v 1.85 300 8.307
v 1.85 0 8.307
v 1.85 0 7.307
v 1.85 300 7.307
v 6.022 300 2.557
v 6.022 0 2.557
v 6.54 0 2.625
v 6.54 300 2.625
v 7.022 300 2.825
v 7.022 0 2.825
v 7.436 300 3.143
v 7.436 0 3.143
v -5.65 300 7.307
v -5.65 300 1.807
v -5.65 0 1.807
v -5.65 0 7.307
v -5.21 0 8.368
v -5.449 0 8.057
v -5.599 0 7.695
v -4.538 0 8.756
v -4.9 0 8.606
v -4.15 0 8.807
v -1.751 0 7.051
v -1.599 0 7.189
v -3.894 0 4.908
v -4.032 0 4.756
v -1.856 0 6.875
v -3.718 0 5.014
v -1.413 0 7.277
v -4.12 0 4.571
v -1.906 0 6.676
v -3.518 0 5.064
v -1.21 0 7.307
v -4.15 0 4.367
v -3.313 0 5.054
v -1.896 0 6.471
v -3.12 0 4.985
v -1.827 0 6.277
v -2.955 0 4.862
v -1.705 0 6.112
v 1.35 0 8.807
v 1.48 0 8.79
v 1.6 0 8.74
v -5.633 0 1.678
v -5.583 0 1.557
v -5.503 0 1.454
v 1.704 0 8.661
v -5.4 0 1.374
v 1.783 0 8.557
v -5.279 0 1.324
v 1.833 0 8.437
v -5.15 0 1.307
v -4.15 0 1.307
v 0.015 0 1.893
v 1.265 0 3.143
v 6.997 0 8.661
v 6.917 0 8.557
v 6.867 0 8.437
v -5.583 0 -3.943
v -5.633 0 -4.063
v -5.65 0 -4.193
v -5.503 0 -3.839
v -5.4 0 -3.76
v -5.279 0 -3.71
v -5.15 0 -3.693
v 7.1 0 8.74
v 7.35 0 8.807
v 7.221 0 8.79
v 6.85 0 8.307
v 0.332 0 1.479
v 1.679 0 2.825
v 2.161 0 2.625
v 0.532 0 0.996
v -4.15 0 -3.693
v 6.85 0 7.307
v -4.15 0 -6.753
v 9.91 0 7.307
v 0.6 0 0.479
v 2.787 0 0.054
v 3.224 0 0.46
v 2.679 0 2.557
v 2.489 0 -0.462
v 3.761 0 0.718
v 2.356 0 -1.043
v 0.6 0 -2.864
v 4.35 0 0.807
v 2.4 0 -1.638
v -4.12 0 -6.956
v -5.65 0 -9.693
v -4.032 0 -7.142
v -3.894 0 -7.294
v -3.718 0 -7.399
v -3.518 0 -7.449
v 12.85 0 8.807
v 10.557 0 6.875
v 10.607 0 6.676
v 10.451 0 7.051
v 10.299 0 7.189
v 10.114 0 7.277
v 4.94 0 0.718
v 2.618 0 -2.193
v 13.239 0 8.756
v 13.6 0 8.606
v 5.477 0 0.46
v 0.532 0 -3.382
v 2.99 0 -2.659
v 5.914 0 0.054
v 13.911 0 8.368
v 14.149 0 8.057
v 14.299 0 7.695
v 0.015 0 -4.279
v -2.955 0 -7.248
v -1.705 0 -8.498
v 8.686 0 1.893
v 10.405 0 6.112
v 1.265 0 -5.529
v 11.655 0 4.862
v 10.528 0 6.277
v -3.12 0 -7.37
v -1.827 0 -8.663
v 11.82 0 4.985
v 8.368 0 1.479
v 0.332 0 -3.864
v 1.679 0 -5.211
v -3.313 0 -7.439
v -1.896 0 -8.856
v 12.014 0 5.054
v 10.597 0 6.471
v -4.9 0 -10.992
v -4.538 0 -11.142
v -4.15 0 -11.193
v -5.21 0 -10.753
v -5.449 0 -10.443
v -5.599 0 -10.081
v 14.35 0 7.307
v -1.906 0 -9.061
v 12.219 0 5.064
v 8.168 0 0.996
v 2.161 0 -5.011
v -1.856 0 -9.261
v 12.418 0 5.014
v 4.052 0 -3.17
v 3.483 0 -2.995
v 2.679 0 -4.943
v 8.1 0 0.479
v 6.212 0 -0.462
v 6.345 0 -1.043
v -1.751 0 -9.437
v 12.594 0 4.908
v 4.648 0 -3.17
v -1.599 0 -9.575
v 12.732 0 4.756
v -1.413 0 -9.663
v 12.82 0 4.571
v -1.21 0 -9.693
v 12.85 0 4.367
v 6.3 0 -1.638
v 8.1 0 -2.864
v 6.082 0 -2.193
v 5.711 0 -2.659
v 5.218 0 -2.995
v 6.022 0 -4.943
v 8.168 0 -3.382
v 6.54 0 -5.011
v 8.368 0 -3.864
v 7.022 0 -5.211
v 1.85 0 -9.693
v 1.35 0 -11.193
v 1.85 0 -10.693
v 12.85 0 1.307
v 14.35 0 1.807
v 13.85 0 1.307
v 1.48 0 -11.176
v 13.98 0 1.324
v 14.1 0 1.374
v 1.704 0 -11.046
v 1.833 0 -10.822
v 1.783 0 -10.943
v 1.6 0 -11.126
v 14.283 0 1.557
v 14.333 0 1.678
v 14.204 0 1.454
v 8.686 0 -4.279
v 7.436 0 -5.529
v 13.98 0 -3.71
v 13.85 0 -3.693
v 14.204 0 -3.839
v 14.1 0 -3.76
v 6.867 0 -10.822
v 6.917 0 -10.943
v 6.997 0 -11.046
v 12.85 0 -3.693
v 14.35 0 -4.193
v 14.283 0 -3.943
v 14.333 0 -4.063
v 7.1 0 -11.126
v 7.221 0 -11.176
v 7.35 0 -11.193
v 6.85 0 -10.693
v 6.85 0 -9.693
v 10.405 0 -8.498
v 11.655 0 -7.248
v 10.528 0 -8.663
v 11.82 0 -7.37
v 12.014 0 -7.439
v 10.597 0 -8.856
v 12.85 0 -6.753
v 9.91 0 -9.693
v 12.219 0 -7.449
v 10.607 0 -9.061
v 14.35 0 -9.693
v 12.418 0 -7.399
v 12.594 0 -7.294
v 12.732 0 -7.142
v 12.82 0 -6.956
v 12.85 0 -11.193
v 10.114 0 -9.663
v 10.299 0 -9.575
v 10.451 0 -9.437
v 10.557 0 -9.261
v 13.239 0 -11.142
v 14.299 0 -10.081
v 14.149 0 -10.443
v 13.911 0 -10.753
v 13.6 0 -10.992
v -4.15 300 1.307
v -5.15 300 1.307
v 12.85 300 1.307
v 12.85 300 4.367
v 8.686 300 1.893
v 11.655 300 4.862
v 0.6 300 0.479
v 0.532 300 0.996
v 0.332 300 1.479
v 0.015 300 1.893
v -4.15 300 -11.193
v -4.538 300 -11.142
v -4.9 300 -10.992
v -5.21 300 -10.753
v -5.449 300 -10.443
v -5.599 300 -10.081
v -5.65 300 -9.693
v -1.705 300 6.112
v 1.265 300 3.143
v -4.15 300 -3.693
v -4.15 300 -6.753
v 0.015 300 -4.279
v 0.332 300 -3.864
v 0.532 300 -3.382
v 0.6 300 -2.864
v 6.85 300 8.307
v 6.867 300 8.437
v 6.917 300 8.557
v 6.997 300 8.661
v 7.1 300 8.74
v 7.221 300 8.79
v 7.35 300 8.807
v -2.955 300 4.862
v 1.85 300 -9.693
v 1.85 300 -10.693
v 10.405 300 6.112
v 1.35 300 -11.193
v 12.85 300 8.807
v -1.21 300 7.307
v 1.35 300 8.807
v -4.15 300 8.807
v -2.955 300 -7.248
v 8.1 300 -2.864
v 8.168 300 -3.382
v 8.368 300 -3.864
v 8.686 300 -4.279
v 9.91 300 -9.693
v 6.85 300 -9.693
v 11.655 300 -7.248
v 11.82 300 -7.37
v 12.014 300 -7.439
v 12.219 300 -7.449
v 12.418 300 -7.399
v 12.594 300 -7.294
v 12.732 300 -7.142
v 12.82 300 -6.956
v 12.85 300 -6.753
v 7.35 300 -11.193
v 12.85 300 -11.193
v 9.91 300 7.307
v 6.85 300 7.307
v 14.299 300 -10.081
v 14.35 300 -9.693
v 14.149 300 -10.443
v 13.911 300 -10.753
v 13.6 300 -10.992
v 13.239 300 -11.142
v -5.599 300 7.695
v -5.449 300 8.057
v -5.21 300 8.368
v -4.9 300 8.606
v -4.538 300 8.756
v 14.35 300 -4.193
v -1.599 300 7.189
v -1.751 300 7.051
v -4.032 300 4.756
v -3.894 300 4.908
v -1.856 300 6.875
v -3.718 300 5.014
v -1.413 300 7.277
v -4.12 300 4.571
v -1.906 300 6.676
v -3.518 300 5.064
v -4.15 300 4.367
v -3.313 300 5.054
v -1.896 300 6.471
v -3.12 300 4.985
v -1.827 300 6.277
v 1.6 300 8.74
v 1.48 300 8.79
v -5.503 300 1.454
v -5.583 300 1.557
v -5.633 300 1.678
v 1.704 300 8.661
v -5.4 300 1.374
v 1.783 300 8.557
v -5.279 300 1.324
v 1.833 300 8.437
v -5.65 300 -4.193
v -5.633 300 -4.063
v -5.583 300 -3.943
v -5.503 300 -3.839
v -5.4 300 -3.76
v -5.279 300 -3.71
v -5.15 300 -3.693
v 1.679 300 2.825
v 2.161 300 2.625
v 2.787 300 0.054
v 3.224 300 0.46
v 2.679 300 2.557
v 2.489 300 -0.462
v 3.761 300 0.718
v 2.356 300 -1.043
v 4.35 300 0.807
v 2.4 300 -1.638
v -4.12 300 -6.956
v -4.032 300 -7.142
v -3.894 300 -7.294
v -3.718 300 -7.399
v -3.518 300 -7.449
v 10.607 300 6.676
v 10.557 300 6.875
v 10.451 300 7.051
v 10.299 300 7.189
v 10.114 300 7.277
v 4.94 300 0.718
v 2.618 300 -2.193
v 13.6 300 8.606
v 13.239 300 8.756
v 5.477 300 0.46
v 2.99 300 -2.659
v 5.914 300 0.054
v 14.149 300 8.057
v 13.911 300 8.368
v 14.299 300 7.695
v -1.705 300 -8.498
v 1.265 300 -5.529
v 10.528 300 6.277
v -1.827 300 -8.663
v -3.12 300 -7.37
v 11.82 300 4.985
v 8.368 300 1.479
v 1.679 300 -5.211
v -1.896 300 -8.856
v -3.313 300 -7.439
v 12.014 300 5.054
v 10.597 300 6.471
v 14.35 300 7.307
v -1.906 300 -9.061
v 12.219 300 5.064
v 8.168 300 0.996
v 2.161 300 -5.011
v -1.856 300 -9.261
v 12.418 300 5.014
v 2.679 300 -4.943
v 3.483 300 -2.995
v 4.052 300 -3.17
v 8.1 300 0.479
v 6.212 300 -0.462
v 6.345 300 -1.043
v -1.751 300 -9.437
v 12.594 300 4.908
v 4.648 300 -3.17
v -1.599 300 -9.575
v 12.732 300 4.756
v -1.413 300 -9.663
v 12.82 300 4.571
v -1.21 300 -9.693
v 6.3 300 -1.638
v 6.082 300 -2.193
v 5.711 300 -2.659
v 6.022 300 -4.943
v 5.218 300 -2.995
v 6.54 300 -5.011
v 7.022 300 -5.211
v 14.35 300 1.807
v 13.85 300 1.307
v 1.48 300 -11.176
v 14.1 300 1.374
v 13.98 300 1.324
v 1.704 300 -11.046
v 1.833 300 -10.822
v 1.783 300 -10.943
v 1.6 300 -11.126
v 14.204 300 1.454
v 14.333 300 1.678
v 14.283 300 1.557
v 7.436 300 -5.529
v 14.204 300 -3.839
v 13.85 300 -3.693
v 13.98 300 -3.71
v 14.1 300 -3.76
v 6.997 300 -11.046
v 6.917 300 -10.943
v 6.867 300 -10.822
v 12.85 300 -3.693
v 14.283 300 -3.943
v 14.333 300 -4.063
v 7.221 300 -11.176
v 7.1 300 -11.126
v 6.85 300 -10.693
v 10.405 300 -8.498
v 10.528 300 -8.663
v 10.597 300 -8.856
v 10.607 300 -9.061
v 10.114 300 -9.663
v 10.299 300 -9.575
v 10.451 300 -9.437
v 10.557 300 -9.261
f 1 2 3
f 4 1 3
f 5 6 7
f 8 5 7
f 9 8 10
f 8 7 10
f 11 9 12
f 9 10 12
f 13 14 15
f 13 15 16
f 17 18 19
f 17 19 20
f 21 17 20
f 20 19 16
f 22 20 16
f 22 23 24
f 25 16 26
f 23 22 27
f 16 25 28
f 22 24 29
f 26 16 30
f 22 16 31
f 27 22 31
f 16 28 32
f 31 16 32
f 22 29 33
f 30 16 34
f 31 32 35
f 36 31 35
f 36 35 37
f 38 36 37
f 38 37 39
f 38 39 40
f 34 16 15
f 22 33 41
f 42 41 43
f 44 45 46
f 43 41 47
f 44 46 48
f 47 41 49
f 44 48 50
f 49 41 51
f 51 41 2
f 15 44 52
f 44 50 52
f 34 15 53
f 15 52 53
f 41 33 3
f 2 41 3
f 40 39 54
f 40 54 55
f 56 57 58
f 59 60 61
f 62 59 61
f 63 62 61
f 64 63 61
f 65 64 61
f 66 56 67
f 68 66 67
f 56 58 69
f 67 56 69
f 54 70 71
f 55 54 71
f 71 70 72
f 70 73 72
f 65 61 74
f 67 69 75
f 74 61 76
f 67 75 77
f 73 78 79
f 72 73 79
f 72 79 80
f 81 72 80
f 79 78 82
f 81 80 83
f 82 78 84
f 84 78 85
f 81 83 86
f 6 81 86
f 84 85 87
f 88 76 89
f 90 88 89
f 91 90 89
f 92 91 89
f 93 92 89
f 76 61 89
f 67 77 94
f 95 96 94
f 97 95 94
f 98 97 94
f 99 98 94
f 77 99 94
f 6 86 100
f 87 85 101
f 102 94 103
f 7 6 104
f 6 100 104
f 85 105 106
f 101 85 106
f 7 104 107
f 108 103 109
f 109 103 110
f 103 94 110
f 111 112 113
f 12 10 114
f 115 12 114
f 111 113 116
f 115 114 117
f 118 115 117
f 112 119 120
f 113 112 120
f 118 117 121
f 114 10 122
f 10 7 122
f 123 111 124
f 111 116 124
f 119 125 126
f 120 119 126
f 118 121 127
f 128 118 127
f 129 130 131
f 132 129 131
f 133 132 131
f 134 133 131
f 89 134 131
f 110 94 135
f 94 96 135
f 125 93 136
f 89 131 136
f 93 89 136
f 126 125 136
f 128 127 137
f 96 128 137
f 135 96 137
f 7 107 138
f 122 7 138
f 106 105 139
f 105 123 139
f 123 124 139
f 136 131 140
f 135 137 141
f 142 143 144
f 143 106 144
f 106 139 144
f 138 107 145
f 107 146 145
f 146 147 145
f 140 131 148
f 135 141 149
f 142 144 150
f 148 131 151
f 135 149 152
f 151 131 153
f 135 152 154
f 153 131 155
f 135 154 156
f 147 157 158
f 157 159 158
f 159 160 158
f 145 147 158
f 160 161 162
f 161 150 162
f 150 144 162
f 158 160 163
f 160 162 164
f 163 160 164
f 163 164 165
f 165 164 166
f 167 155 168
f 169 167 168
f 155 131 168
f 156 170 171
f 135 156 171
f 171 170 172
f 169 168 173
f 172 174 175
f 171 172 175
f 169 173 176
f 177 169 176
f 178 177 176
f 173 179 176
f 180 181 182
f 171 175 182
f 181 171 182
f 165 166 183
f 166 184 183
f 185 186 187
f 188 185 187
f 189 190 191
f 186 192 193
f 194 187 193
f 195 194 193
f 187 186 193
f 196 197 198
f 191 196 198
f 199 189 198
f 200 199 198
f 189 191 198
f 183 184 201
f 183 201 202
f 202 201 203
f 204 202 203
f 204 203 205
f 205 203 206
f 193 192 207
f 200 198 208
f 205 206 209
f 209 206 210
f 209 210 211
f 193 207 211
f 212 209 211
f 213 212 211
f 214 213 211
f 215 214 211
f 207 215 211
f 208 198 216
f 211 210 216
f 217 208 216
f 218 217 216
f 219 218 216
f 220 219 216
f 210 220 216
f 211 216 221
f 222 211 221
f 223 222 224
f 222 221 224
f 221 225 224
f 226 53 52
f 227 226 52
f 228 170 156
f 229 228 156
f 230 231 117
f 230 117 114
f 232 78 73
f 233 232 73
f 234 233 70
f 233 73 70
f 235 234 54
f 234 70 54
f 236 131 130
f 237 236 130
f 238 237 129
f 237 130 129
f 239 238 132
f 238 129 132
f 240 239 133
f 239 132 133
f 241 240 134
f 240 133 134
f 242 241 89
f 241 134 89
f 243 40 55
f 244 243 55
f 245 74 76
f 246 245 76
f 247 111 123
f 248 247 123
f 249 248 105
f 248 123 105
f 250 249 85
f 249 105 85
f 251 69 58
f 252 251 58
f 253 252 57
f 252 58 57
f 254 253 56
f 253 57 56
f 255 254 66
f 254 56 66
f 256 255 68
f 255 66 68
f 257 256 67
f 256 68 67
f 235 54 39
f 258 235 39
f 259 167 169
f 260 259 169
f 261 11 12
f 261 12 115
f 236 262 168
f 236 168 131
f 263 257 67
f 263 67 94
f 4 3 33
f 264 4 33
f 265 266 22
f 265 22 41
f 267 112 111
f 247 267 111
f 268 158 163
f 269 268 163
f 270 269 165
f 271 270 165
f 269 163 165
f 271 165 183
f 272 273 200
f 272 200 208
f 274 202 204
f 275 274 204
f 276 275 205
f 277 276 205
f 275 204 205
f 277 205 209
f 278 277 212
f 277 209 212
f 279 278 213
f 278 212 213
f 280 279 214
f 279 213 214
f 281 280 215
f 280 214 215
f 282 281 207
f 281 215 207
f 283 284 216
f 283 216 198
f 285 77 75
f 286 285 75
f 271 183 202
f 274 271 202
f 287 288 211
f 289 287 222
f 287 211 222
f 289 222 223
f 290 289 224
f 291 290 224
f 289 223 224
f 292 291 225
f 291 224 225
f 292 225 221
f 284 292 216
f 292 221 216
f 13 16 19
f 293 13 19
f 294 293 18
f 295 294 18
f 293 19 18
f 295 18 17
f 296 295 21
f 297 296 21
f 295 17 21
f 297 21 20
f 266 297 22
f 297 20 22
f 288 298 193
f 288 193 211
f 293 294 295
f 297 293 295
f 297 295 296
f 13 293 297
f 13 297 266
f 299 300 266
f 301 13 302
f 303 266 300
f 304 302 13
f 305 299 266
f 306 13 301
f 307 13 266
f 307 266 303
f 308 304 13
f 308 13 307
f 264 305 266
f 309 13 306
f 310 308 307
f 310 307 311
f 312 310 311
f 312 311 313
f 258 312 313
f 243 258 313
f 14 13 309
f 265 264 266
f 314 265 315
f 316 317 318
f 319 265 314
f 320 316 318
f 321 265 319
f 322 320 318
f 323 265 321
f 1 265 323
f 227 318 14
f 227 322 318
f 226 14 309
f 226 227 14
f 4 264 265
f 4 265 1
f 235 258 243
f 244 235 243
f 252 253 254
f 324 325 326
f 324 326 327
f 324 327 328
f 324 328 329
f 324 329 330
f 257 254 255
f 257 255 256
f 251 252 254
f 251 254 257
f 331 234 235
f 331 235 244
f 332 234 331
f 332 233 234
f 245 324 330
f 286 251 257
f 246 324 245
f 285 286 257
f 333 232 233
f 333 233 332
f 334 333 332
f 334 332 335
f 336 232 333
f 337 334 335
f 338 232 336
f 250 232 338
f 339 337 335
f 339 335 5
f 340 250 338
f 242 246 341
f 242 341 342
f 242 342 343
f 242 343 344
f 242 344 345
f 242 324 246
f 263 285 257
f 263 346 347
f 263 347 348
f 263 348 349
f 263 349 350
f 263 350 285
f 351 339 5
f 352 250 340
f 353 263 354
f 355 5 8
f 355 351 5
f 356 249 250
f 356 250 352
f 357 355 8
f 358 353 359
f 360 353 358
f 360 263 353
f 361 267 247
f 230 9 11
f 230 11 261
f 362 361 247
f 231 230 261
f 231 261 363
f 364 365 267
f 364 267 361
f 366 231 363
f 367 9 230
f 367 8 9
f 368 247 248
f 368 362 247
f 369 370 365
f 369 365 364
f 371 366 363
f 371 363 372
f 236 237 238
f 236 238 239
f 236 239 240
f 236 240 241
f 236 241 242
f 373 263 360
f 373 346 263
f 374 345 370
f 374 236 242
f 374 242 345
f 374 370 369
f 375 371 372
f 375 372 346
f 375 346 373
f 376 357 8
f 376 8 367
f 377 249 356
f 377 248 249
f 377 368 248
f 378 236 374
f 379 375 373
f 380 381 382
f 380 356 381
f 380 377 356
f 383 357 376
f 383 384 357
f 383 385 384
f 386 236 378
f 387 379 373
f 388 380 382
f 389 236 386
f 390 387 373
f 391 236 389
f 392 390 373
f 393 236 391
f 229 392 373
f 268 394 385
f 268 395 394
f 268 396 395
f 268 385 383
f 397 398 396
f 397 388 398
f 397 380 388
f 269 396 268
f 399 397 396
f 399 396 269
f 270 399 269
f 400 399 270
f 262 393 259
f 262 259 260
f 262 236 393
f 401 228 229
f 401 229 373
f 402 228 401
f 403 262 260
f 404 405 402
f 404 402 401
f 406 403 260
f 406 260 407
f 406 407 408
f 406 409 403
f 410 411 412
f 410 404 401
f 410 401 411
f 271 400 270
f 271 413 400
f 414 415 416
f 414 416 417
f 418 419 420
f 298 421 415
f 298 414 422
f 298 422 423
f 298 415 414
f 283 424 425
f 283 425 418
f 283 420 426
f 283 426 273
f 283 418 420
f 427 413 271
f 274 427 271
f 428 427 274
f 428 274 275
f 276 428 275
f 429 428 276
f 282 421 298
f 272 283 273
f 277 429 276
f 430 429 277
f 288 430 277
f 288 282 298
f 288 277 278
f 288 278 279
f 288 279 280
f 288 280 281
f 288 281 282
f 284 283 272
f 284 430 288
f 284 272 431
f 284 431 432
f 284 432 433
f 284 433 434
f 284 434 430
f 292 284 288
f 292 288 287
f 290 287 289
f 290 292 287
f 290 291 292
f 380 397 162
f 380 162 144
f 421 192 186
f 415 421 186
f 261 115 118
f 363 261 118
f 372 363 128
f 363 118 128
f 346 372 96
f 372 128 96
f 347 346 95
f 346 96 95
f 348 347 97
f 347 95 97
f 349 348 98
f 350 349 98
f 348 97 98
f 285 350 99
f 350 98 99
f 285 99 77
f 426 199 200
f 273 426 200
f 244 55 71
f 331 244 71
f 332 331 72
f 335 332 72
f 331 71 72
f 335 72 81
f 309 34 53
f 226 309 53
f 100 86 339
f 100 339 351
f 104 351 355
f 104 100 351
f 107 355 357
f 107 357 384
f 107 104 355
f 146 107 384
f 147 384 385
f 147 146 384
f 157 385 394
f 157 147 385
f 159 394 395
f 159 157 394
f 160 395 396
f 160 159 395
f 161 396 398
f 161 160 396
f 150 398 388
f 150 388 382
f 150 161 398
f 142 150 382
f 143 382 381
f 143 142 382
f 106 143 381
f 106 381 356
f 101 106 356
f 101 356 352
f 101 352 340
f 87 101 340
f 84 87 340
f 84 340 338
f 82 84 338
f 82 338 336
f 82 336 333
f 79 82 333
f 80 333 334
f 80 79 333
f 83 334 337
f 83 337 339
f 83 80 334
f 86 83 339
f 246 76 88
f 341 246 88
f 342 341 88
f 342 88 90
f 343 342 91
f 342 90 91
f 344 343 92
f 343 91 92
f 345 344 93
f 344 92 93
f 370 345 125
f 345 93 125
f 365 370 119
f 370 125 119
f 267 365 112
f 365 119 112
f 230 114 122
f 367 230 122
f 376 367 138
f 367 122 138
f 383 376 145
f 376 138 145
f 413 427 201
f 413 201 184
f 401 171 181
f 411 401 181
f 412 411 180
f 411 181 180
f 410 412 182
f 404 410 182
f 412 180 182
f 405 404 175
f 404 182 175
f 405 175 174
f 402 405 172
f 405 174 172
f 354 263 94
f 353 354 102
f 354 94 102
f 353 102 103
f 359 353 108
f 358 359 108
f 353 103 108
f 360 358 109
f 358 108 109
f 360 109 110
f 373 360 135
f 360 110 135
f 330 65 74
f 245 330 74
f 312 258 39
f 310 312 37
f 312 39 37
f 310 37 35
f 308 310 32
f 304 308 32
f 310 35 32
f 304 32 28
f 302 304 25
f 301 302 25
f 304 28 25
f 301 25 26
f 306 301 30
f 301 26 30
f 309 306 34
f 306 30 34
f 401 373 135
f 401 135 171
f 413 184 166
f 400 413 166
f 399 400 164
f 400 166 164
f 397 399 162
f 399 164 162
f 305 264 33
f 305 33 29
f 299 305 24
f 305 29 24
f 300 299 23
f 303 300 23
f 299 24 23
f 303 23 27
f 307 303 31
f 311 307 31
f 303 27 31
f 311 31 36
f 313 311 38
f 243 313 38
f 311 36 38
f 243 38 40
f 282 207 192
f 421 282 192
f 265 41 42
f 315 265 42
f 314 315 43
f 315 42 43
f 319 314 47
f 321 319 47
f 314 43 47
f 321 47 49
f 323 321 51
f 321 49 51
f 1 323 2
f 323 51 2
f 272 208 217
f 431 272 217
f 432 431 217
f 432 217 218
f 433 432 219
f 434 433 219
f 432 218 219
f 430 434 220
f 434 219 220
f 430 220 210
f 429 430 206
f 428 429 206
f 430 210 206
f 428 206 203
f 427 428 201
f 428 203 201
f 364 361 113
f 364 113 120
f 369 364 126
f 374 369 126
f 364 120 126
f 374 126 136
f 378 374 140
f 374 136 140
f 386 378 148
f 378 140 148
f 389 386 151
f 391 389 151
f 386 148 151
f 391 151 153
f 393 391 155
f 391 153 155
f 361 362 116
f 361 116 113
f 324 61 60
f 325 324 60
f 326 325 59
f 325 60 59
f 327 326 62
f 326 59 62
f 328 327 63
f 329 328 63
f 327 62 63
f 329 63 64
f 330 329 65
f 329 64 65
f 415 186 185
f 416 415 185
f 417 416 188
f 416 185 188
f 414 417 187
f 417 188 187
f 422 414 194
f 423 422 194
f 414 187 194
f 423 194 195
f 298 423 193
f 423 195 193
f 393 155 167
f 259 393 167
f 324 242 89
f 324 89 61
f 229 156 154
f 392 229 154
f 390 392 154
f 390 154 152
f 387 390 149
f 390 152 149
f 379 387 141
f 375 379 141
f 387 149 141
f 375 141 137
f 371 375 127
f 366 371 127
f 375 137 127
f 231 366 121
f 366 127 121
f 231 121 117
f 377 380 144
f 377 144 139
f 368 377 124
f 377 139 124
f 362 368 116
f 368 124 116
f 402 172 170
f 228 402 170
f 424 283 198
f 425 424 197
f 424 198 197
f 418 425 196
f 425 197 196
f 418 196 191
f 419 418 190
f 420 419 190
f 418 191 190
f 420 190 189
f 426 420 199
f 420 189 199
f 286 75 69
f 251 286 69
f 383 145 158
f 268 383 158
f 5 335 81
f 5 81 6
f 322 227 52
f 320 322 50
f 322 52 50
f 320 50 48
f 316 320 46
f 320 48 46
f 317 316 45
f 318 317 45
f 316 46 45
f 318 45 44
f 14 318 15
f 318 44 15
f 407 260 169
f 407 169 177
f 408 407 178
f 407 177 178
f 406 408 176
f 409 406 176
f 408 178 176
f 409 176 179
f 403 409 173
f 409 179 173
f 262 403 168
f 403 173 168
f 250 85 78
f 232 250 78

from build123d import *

# Parameters (mm, degrees)
ESQUISSE1_R        = 2
BOSS_EXTRU_1_DEPTH = 300


with BuildPart() as part:
    # Esquisse1 → Boss.-Extru.1 (new body)
    with BuildSketch(Plane(origin=(0, 0, 0), x_dir=(1, 0, 0), z_dir=(0, 1, 0))):
        with BuildLine():
            Line((-5.649708969, 9.692729836), (-5.649708969, 4.192729836))
            ThreePointArc((-5.649708969, 4.192729836), (-5.503262359, 3.839176445), (-5.149708969, 3.692729836))
            Line((-5.149708969, 3.692729836), (-4.149708969, 3.692729836))
            Line((-4.149708969, 3.692729836), (-4.149708969, 6.752780342))
            ThreePointArc((-4.149708969, 6.752780342), (-3.717587371, 7.399496015), (-2.954734222, 7.247755089))
            Line((-2.954734222, 7.247755089), (0.014504594, 4.278516274))
            ThreePointArc((0.014504594, 4.278516274), (0.448050096, 3.629669576), (0.600291031, 2.864302711))
            Line((0.600291031, 2.864302711), (0.600291031, -0.478843039))
            ThreePointArc((0.600291031, -0.478843039), (0.448050096, -1.244209904), (0.014504594, -1.893056602))
            Line((0.014504594, -1.893056602), (-2.954734222, -4.862295417))
            ThreePointArc((-2.954734222, -4.862295417), (-3.717587371, -5.014036343), (-4.149708969, -4.36732067))
            Line((-4.149708969, -4.36732067), (-4.149708969, -1.307270164))
            Line((-4.149708969, -1.307270164), (-5.149708969, -1.307270164))
            ThreePointArc((-5.149708969, -1.307270164), (-5.503262359, -1.453716774), (-5.649708969, -1.807270164))
            Line((-5.649708969, -1.807270164), (-5.649708969, -7.307270164))
            ThreePointArc((-5.649708969, -7.307270164), (-5.21036914, -8.367930336), (-4.149708969, -8.807270164))
            Line((-4.149708969, -8.807270164), (1.350291031, -8.807270164))
            ThreePointArc((1.350291031, -8.807270164), (1.703844422, -8.660823555), (1.850291031, -8.307270164))
            Line((1.850291031, -8.307270164), (1.850291031, -7.307270164))
            Line((1.850291031, -7.307270164), (-1.209759475, -7.307270164))
            ThreePointArc((-1.209759475, -7.307270164), (-1.856475148, -6.875148567), (-1.704734222, -6.112295417))
            Line((-1.704734222, -6.112295417), (1.264504594, -3.143056602))
            ThreePointArc((1.264504594, -3.143056602), (1.913351291, -2.709511099), (2.678718156, -2.557270164))
            Line((2.678718156, -2.557270164), (6.021863907, -2.557270164))
            ThreePointArc((6.021863907, -2.557270164), (6.787230771, -2.709511099), (7.436077469, -3.143056602))
            Line((7.436077469, -3.143056602), (10.405316285, -6.112295417))
            ThreePointArc((10.405316285, -6.112295417), (10.557057211, -6.875148567), (9.910341538, -7.307270164))
            Line((9.910341538, -7.307270164), (6.850291031, -7.307270164))
            Line((6.850291031, -7.307270164), (6.850291031, -8.307270164))
            ThreePointArc((6.850291031, -8.307270164), (6.996737641, -8.660823555), (7.350291031, -8.807270164))
            Line((7.350291031, -8.807270164), (12.850291031, -8.807270164))
            ThreePointArc((12.850291031, -8.807270164), (13.910951203, -8.367930336), (14.350291031, -7.307270164))
            Line((14.350291031, -7.307270164), (14.350291031, -1.807270164))
            ThreePointArc((14.350291031, -1.807270164), (14.203844422, -1.453716774), (13.850291031, -1.307270164))
            Line((13.850291031, -1.307270164), (12.850291031, -1.307270164))
            Line((12.850291031, -1.307270164), (12.850291031, -4.36732067))
            ThreePointArc((12.850291031, -4.36732067), (12.418169434, -5.014036343), (11.655316285, -4.862295417))
            Line((11.655316285, -4.862295417), (8.686077469, -1.893056602))
            ThreePointArc((8.686077469, -1.893056602), (8.252531966, -1.244209904), (8.100291031, -0.478843039))
            Line((8.100291031, -0.478843039), (8.100291031, 2.864302711))
            ThreePointArc((8.100291031, 2.864302711), (8.252531966, 3.629669576), (8.686077469, 4.278516274))
            Line((8.686077469, 4.278516274), (11.655316285, 7.247755089))
            ThreePointArc((11.655316285, 7.247755089), (12.418169434, 7.399496015), (12.850291031, 6.752780342))
            Line((12.850291031, 6.752780342), (12.850291031, 3.692729836))
            Line((12.850291031, 3.692729836), (13.850291031, 3.692729836))
            ThreePointArc((13.850291031, 3.692729836), (14.203844422, 3.839176445), (14.350291031, 4.192729836))
            Line((14.350291031, 4.192729836), (14.350291031, 9.692729836))
            ThreePointArc((14.350291031, 9.692729836), (13.910951203, 10.753390008), (12.850291031, 11.192729836))
            Line((12.850291031, 11.192729836), (7.350291031, 11.192729836))
            ThreePointArc((7.350291031, 11.192729836), (6.996737641, 11.046283226), (6.850291031, 10.692729836))
            Line((6.850291031, 10.692729836), (6.850291031, 9.692729836))
            Line((6.850291031, 9.692729836), (9.910341538, 9.692729836))
            ThreePointArc((9.910341538, 9.692729836), (10.557057211, 9.260608239), (10.405316285, 8.497755089))
            Line((10.405316285, 8.497755089), (7.436077469, 5.528516274))
            ThreePointArc((7.436077469, 5.528516274), (6.787230771, 5.094970771), (6.021863907, 4.942729836))
            Line((6.021863907, 4.942729836), (2.678718156, 4.942729836))
            ThreePointArc((2.678718156, 4.942729836), (1.913351291, 5.094970771), (1.264504594, 5.528516274))
            Line((1.264504594, 5.528516274), (-1.704734222, 8.497755089))
            ThreePointArc((-1.704734222, 8.497755089), (-1.856475148, 9.260608239), (-1.209759475, 9.692729836))
            Line((-1.209759475, 9.692729836), (1.850291031, 9.692729836))
            Line((1.850291031, 9.692729836), (1.850291031, 10.692729836))
            ThreePointArc((1.850291031, 10.692729836), (1.703844422, 11.046283226), (1.350291031, 11.192729836))
            Line((1.350291031, 11.192729836), (-4.149708969, 11.192729836))
            ThreePointArc((-4.149708969, 11.192729836), (-5.21036914, 10.753390008), (-5.649708969, 9.692729836))
        make_face()
        with Locations(Location((4.350291031, 1.192729836, 0), (0, 0, 270))):
            Circle(ESQUISSE1_R, mode=Mode.SUBTRACT)
    extrude(amount=BOSS_EXTRU_1_DEPTH)


solid = part.part
